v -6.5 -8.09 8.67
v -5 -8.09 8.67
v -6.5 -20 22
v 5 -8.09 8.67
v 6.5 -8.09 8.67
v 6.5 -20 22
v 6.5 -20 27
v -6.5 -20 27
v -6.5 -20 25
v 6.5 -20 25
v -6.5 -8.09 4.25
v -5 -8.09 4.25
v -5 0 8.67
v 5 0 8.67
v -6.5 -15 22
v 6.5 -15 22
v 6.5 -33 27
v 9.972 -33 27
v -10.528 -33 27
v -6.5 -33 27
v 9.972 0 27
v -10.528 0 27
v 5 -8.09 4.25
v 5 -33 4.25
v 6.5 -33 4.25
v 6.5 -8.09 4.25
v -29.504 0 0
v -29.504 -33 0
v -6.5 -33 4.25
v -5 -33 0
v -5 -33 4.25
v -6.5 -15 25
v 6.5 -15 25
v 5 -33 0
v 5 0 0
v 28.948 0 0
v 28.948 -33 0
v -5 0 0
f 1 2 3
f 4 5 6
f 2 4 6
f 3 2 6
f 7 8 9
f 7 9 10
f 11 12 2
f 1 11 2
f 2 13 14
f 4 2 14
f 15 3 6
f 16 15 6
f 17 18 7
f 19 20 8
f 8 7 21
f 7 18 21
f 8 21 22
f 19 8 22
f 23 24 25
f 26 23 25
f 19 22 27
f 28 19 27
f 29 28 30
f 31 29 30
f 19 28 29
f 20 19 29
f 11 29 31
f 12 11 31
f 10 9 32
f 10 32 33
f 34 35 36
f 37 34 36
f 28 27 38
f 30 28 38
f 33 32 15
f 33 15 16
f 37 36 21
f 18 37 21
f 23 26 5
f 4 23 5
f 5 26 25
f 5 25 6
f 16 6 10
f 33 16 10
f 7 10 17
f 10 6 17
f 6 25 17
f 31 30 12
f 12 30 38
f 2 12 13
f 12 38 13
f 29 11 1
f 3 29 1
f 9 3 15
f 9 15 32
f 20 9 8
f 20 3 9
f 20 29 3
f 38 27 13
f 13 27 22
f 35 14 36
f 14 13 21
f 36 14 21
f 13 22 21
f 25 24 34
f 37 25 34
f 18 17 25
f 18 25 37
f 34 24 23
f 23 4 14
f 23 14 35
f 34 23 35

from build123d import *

# Parameters (mm, degrees)
F1_DEPTH = 33
F2_W     = 13
F2_H     = 22.75
F3_DEPTH = 13
F4_W     = 13
F4_H     = 3
F5_DEPTH = 5
F7_DEPTH = 6.5


with BuildPart() as f1:
    # F0 (on Front) → F1 (new body)
    with BuildSketch(Plane.XZ):
        Polygon((-10.527857, 27), (-29.503775, 0), (-5, 0), (-5, 8.67), (5, 8.67), (5, 0), (28.948061, 0), (9.972143, 27), align=None)
    extrude(amount=F1_DEPTH)

    # F2 (on face) → F3 (cut)
    with BuildSketch(Plane.XZ.offset(33)):
        with Locations((0, 15.625)):
            Rectangle(F2_W, F2_H)
    extrude(amount=-F3_DEPTH, mode=Mode.SUBTRACT)

    # F4 (on face) → F5 (cut)
    with BuildSketch(Plane.XZ.offset(20)):
        with Locations((0, 23.5)):
            Rectangle(F4_W, F4_H)
    extrude(amount=-F5_DEPTH, mode=Mode.SUBTRACT)

    # F6 (on Right) → F7 (cut, symmetric)
    with BuildSketch(Plane.YZ):
        Polygon((-8.09, 8.67), (-20, 22), (-20, 4.25), (-8.09, 4.25), align=None)
    extrude(amount=F7_DEPTH, both=True, mode=Mode.SUBTRACT)


solid = f1.part
